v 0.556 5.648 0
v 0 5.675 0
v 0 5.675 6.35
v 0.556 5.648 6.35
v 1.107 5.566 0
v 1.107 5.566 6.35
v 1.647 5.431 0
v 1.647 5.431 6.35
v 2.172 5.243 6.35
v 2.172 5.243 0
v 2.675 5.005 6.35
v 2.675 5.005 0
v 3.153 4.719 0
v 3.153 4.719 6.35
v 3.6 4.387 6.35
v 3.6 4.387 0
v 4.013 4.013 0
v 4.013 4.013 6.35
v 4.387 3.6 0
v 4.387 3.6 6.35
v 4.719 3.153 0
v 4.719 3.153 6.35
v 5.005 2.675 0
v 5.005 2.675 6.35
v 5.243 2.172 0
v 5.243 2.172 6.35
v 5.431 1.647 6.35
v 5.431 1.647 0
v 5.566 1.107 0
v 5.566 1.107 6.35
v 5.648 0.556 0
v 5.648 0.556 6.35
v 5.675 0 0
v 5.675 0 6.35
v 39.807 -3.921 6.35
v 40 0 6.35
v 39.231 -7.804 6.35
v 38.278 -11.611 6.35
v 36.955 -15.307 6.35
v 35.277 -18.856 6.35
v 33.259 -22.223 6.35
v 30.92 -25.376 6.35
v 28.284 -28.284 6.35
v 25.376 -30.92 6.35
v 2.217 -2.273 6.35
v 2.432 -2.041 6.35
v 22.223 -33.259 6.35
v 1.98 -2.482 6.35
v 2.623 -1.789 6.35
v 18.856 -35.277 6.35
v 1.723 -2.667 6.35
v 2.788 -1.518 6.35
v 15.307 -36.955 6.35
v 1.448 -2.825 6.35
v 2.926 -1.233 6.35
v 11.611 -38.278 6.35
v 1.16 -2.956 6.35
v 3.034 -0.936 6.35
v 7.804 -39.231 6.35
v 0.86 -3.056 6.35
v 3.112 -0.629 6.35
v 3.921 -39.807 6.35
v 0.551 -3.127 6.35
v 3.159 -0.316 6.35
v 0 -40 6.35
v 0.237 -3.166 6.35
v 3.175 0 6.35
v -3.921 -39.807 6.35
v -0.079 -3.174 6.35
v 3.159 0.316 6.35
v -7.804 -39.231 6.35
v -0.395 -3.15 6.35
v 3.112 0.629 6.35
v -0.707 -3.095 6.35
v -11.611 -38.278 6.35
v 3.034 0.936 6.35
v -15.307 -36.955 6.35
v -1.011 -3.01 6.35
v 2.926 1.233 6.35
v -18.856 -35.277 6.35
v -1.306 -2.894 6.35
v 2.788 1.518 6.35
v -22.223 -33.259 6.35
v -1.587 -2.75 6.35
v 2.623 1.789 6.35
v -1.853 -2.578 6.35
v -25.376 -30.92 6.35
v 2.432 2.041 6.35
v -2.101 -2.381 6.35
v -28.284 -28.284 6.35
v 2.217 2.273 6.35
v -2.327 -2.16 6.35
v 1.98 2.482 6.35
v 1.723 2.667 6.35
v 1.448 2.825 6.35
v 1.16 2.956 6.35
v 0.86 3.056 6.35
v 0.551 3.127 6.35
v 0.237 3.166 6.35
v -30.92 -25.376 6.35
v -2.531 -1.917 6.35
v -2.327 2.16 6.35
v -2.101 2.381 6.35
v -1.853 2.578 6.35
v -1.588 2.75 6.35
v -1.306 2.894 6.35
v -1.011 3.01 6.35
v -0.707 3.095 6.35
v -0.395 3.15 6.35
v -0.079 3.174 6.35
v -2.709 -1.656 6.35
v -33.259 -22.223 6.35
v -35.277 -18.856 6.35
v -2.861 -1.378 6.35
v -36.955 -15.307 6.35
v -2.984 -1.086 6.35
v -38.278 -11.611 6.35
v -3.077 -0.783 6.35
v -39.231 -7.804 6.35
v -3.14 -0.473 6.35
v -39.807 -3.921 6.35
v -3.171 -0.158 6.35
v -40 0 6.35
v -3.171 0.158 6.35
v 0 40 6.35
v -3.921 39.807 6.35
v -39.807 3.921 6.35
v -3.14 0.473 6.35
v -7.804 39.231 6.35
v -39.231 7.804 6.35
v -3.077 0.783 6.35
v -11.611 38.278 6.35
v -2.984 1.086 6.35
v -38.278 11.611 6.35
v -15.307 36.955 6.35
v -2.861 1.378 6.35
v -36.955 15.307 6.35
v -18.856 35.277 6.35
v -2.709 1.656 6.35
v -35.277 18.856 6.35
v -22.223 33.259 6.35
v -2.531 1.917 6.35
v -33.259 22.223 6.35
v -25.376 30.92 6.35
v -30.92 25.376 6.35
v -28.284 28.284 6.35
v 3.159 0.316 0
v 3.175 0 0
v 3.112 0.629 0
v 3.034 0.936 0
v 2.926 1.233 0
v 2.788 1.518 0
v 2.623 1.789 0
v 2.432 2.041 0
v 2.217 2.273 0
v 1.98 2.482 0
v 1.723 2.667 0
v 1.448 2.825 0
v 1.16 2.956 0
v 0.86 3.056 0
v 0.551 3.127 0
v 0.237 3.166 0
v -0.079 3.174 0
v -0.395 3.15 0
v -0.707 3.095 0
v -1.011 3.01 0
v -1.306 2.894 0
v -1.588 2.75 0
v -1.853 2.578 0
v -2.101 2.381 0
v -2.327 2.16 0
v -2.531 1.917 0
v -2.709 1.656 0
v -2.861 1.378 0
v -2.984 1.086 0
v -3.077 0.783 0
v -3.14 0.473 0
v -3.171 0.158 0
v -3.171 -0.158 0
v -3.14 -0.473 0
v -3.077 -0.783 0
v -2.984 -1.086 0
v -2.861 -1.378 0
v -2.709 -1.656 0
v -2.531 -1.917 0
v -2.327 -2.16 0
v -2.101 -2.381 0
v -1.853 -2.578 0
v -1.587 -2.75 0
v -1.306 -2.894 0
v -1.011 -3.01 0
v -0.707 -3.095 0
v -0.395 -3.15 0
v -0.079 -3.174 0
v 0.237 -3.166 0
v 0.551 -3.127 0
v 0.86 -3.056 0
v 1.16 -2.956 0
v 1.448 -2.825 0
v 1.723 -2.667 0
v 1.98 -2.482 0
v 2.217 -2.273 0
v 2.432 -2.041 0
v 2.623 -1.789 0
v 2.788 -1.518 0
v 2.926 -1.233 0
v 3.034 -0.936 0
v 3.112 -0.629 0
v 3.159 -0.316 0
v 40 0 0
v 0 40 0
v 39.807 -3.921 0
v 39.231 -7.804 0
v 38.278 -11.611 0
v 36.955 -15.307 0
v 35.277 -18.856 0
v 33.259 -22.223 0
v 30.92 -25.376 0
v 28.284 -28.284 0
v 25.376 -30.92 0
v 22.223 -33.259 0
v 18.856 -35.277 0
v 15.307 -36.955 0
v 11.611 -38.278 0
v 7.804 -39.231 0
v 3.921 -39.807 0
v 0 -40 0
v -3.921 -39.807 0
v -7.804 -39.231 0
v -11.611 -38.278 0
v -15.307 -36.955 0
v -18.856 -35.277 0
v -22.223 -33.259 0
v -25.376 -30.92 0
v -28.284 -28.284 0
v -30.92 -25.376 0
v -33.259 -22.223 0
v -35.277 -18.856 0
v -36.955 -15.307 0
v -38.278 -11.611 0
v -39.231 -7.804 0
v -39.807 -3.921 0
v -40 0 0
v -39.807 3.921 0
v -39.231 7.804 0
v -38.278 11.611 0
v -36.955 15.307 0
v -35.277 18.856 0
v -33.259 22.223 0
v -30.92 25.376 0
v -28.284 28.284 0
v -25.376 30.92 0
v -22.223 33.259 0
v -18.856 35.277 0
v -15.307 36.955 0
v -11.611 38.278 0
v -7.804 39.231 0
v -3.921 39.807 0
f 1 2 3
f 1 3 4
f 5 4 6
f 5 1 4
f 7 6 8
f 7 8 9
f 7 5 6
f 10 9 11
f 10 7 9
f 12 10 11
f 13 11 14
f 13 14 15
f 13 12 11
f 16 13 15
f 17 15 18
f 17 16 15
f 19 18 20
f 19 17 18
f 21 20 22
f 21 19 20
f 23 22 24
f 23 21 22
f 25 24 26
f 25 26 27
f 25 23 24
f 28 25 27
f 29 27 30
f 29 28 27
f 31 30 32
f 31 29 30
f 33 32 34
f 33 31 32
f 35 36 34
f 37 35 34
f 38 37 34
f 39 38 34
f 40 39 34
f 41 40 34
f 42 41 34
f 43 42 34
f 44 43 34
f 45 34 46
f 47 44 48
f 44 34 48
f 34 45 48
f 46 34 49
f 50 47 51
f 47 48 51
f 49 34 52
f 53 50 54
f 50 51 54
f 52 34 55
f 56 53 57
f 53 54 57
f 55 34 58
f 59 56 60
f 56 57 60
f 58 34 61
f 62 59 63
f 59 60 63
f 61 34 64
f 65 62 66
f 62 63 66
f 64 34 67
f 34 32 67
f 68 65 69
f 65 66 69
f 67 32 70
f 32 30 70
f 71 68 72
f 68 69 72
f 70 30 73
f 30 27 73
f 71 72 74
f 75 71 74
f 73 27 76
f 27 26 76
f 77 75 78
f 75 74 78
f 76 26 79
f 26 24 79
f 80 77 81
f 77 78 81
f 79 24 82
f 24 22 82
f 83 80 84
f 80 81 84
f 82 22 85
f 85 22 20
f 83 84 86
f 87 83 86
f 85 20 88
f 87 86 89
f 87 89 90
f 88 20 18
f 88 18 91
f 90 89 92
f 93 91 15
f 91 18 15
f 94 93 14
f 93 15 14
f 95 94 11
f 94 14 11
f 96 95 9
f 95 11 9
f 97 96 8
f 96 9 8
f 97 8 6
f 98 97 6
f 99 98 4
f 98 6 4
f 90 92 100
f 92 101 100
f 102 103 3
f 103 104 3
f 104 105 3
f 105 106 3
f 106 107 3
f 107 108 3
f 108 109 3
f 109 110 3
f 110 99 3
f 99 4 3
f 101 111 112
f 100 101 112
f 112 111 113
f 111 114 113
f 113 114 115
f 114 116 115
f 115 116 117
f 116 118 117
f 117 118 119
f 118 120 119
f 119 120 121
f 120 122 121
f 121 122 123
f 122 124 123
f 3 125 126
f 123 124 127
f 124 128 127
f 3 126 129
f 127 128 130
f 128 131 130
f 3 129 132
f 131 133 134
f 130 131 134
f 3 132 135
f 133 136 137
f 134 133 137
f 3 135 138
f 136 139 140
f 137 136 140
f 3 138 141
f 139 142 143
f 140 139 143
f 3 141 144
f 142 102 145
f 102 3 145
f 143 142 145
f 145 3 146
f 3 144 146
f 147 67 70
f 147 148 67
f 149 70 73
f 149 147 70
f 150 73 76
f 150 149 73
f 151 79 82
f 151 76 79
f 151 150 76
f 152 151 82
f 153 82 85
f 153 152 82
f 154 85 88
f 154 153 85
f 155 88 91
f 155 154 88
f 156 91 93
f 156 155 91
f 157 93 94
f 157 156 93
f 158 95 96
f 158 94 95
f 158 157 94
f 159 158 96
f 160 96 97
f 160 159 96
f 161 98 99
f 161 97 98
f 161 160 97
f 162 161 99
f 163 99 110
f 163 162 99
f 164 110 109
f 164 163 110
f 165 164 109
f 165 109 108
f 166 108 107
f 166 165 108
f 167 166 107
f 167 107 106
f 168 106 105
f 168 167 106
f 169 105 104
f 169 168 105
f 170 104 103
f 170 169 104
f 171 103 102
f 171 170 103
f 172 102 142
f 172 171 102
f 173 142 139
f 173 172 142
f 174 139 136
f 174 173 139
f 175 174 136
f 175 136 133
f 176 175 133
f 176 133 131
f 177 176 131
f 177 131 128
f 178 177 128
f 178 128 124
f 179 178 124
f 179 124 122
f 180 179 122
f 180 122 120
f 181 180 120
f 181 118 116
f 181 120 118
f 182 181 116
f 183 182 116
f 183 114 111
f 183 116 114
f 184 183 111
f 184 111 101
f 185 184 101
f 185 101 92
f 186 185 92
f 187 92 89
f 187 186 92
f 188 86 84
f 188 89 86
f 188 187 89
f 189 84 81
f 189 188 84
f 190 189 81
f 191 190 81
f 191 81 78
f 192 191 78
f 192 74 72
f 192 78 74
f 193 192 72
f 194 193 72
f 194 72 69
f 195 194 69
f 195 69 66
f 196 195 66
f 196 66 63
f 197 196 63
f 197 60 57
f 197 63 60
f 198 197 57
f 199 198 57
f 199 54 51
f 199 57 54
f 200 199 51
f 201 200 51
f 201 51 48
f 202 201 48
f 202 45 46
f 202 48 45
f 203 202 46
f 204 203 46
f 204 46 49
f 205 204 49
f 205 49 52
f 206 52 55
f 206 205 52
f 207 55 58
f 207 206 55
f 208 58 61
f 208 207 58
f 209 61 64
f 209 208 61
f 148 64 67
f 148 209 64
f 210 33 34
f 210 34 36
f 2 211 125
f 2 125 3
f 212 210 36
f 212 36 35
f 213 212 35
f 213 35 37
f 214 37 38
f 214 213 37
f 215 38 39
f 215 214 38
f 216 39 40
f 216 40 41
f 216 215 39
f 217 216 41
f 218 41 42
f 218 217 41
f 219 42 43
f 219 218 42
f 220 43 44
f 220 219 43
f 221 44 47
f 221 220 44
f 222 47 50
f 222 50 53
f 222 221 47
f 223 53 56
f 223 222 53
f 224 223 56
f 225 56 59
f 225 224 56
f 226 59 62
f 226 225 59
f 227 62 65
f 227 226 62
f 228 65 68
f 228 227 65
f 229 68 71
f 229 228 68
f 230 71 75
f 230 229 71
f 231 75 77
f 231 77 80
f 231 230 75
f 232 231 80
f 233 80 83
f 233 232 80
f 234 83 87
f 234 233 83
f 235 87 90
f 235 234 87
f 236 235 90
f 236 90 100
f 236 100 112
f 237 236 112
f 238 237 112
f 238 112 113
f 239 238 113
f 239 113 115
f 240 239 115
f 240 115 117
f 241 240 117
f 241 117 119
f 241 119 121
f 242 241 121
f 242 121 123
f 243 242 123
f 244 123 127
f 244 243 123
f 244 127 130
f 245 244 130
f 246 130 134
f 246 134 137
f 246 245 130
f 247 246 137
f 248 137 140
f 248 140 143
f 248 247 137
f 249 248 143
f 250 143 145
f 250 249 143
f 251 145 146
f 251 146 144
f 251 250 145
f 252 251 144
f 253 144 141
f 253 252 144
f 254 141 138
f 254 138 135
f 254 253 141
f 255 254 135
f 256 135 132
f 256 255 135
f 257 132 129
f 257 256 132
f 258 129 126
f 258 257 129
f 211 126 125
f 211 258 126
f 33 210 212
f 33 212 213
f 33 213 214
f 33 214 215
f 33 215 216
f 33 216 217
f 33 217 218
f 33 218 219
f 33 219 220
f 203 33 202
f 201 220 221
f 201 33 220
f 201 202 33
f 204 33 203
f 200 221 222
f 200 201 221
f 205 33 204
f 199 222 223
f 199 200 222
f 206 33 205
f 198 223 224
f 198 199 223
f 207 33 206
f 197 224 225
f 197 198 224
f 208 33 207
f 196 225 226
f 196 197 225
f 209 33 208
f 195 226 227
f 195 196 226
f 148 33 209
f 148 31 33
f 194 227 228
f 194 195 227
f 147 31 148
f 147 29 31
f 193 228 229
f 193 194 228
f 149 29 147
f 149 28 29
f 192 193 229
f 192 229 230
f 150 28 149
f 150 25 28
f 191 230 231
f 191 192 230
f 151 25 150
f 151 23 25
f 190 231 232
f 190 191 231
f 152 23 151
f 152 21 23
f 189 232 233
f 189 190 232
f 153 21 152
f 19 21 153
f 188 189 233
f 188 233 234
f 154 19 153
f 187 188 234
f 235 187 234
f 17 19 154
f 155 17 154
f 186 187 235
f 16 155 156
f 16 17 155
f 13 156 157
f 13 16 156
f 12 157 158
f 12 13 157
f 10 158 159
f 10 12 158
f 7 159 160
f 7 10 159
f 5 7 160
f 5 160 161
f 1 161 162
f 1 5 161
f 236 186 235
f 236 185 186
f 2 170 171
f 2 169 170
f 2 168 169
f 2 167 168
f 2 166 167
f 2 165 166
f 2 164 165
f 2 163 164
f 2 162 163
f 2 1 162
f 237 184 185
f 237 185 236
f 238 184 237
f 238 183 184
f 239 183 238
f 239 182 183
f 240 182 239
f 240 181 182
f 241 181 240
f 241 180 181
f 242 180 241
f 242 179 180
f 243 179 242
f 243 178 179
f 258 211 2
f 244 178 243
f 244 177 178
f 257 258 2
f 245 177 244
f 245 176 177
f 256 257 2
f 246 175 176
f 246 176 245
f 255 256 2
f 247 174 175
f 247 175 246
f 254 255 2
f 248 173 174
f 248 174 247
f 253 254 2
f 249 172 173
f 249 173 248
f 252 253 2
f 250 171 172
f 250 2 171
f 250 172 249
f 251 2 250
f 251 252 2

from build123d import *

# Parameters (mm, degrees)
BOSS_EXTRUDE1_DEPTH     = 6.35
CUT_EXTRUDE1_DEPTH      = 57.9238307
CUT_EXTRUDE1_DEPTH_BACK = 57.9238307
SKETCH2_R               = 3.175


with BuildPart() as part:
    # Sketch1 → Boss-Extrude1 (new body)
    with BuildSketch(Plane.XY):
        with BuildLine():
            Line((5.674999953, 0), (40.00000001, 0))
            ThreePointArc((40.00000001, 0), (-28.284271255, -28.284271255), (0, 40.00000001))
            Line((0, 40.00000001), (0, 5.674999953))
            ThreePointArc((0, 5.674999953), (4.01283095, 4.01283095), (5.674999953, 0))
        make_face()
    extrude(amount=BOSS_EXTRUDE1_DEPTH)

    # Sketch2 → Cut-Extrude1 (cut, two sides: drawn at the far end of the back side and taken through both)
    with BuildSketch(Plane.XY.offset(6.35).offset(-CUT_EXTRUDE1_DEPTH_BACK)):
        Circle(SKETCH2_R)
    extrude(amount=CUT_EXTRUDE1_DEPTH + CUT_EXTRUDE1_DEPTH_BACK, mode=Mode.SUBTRACT)


solid = part.part
